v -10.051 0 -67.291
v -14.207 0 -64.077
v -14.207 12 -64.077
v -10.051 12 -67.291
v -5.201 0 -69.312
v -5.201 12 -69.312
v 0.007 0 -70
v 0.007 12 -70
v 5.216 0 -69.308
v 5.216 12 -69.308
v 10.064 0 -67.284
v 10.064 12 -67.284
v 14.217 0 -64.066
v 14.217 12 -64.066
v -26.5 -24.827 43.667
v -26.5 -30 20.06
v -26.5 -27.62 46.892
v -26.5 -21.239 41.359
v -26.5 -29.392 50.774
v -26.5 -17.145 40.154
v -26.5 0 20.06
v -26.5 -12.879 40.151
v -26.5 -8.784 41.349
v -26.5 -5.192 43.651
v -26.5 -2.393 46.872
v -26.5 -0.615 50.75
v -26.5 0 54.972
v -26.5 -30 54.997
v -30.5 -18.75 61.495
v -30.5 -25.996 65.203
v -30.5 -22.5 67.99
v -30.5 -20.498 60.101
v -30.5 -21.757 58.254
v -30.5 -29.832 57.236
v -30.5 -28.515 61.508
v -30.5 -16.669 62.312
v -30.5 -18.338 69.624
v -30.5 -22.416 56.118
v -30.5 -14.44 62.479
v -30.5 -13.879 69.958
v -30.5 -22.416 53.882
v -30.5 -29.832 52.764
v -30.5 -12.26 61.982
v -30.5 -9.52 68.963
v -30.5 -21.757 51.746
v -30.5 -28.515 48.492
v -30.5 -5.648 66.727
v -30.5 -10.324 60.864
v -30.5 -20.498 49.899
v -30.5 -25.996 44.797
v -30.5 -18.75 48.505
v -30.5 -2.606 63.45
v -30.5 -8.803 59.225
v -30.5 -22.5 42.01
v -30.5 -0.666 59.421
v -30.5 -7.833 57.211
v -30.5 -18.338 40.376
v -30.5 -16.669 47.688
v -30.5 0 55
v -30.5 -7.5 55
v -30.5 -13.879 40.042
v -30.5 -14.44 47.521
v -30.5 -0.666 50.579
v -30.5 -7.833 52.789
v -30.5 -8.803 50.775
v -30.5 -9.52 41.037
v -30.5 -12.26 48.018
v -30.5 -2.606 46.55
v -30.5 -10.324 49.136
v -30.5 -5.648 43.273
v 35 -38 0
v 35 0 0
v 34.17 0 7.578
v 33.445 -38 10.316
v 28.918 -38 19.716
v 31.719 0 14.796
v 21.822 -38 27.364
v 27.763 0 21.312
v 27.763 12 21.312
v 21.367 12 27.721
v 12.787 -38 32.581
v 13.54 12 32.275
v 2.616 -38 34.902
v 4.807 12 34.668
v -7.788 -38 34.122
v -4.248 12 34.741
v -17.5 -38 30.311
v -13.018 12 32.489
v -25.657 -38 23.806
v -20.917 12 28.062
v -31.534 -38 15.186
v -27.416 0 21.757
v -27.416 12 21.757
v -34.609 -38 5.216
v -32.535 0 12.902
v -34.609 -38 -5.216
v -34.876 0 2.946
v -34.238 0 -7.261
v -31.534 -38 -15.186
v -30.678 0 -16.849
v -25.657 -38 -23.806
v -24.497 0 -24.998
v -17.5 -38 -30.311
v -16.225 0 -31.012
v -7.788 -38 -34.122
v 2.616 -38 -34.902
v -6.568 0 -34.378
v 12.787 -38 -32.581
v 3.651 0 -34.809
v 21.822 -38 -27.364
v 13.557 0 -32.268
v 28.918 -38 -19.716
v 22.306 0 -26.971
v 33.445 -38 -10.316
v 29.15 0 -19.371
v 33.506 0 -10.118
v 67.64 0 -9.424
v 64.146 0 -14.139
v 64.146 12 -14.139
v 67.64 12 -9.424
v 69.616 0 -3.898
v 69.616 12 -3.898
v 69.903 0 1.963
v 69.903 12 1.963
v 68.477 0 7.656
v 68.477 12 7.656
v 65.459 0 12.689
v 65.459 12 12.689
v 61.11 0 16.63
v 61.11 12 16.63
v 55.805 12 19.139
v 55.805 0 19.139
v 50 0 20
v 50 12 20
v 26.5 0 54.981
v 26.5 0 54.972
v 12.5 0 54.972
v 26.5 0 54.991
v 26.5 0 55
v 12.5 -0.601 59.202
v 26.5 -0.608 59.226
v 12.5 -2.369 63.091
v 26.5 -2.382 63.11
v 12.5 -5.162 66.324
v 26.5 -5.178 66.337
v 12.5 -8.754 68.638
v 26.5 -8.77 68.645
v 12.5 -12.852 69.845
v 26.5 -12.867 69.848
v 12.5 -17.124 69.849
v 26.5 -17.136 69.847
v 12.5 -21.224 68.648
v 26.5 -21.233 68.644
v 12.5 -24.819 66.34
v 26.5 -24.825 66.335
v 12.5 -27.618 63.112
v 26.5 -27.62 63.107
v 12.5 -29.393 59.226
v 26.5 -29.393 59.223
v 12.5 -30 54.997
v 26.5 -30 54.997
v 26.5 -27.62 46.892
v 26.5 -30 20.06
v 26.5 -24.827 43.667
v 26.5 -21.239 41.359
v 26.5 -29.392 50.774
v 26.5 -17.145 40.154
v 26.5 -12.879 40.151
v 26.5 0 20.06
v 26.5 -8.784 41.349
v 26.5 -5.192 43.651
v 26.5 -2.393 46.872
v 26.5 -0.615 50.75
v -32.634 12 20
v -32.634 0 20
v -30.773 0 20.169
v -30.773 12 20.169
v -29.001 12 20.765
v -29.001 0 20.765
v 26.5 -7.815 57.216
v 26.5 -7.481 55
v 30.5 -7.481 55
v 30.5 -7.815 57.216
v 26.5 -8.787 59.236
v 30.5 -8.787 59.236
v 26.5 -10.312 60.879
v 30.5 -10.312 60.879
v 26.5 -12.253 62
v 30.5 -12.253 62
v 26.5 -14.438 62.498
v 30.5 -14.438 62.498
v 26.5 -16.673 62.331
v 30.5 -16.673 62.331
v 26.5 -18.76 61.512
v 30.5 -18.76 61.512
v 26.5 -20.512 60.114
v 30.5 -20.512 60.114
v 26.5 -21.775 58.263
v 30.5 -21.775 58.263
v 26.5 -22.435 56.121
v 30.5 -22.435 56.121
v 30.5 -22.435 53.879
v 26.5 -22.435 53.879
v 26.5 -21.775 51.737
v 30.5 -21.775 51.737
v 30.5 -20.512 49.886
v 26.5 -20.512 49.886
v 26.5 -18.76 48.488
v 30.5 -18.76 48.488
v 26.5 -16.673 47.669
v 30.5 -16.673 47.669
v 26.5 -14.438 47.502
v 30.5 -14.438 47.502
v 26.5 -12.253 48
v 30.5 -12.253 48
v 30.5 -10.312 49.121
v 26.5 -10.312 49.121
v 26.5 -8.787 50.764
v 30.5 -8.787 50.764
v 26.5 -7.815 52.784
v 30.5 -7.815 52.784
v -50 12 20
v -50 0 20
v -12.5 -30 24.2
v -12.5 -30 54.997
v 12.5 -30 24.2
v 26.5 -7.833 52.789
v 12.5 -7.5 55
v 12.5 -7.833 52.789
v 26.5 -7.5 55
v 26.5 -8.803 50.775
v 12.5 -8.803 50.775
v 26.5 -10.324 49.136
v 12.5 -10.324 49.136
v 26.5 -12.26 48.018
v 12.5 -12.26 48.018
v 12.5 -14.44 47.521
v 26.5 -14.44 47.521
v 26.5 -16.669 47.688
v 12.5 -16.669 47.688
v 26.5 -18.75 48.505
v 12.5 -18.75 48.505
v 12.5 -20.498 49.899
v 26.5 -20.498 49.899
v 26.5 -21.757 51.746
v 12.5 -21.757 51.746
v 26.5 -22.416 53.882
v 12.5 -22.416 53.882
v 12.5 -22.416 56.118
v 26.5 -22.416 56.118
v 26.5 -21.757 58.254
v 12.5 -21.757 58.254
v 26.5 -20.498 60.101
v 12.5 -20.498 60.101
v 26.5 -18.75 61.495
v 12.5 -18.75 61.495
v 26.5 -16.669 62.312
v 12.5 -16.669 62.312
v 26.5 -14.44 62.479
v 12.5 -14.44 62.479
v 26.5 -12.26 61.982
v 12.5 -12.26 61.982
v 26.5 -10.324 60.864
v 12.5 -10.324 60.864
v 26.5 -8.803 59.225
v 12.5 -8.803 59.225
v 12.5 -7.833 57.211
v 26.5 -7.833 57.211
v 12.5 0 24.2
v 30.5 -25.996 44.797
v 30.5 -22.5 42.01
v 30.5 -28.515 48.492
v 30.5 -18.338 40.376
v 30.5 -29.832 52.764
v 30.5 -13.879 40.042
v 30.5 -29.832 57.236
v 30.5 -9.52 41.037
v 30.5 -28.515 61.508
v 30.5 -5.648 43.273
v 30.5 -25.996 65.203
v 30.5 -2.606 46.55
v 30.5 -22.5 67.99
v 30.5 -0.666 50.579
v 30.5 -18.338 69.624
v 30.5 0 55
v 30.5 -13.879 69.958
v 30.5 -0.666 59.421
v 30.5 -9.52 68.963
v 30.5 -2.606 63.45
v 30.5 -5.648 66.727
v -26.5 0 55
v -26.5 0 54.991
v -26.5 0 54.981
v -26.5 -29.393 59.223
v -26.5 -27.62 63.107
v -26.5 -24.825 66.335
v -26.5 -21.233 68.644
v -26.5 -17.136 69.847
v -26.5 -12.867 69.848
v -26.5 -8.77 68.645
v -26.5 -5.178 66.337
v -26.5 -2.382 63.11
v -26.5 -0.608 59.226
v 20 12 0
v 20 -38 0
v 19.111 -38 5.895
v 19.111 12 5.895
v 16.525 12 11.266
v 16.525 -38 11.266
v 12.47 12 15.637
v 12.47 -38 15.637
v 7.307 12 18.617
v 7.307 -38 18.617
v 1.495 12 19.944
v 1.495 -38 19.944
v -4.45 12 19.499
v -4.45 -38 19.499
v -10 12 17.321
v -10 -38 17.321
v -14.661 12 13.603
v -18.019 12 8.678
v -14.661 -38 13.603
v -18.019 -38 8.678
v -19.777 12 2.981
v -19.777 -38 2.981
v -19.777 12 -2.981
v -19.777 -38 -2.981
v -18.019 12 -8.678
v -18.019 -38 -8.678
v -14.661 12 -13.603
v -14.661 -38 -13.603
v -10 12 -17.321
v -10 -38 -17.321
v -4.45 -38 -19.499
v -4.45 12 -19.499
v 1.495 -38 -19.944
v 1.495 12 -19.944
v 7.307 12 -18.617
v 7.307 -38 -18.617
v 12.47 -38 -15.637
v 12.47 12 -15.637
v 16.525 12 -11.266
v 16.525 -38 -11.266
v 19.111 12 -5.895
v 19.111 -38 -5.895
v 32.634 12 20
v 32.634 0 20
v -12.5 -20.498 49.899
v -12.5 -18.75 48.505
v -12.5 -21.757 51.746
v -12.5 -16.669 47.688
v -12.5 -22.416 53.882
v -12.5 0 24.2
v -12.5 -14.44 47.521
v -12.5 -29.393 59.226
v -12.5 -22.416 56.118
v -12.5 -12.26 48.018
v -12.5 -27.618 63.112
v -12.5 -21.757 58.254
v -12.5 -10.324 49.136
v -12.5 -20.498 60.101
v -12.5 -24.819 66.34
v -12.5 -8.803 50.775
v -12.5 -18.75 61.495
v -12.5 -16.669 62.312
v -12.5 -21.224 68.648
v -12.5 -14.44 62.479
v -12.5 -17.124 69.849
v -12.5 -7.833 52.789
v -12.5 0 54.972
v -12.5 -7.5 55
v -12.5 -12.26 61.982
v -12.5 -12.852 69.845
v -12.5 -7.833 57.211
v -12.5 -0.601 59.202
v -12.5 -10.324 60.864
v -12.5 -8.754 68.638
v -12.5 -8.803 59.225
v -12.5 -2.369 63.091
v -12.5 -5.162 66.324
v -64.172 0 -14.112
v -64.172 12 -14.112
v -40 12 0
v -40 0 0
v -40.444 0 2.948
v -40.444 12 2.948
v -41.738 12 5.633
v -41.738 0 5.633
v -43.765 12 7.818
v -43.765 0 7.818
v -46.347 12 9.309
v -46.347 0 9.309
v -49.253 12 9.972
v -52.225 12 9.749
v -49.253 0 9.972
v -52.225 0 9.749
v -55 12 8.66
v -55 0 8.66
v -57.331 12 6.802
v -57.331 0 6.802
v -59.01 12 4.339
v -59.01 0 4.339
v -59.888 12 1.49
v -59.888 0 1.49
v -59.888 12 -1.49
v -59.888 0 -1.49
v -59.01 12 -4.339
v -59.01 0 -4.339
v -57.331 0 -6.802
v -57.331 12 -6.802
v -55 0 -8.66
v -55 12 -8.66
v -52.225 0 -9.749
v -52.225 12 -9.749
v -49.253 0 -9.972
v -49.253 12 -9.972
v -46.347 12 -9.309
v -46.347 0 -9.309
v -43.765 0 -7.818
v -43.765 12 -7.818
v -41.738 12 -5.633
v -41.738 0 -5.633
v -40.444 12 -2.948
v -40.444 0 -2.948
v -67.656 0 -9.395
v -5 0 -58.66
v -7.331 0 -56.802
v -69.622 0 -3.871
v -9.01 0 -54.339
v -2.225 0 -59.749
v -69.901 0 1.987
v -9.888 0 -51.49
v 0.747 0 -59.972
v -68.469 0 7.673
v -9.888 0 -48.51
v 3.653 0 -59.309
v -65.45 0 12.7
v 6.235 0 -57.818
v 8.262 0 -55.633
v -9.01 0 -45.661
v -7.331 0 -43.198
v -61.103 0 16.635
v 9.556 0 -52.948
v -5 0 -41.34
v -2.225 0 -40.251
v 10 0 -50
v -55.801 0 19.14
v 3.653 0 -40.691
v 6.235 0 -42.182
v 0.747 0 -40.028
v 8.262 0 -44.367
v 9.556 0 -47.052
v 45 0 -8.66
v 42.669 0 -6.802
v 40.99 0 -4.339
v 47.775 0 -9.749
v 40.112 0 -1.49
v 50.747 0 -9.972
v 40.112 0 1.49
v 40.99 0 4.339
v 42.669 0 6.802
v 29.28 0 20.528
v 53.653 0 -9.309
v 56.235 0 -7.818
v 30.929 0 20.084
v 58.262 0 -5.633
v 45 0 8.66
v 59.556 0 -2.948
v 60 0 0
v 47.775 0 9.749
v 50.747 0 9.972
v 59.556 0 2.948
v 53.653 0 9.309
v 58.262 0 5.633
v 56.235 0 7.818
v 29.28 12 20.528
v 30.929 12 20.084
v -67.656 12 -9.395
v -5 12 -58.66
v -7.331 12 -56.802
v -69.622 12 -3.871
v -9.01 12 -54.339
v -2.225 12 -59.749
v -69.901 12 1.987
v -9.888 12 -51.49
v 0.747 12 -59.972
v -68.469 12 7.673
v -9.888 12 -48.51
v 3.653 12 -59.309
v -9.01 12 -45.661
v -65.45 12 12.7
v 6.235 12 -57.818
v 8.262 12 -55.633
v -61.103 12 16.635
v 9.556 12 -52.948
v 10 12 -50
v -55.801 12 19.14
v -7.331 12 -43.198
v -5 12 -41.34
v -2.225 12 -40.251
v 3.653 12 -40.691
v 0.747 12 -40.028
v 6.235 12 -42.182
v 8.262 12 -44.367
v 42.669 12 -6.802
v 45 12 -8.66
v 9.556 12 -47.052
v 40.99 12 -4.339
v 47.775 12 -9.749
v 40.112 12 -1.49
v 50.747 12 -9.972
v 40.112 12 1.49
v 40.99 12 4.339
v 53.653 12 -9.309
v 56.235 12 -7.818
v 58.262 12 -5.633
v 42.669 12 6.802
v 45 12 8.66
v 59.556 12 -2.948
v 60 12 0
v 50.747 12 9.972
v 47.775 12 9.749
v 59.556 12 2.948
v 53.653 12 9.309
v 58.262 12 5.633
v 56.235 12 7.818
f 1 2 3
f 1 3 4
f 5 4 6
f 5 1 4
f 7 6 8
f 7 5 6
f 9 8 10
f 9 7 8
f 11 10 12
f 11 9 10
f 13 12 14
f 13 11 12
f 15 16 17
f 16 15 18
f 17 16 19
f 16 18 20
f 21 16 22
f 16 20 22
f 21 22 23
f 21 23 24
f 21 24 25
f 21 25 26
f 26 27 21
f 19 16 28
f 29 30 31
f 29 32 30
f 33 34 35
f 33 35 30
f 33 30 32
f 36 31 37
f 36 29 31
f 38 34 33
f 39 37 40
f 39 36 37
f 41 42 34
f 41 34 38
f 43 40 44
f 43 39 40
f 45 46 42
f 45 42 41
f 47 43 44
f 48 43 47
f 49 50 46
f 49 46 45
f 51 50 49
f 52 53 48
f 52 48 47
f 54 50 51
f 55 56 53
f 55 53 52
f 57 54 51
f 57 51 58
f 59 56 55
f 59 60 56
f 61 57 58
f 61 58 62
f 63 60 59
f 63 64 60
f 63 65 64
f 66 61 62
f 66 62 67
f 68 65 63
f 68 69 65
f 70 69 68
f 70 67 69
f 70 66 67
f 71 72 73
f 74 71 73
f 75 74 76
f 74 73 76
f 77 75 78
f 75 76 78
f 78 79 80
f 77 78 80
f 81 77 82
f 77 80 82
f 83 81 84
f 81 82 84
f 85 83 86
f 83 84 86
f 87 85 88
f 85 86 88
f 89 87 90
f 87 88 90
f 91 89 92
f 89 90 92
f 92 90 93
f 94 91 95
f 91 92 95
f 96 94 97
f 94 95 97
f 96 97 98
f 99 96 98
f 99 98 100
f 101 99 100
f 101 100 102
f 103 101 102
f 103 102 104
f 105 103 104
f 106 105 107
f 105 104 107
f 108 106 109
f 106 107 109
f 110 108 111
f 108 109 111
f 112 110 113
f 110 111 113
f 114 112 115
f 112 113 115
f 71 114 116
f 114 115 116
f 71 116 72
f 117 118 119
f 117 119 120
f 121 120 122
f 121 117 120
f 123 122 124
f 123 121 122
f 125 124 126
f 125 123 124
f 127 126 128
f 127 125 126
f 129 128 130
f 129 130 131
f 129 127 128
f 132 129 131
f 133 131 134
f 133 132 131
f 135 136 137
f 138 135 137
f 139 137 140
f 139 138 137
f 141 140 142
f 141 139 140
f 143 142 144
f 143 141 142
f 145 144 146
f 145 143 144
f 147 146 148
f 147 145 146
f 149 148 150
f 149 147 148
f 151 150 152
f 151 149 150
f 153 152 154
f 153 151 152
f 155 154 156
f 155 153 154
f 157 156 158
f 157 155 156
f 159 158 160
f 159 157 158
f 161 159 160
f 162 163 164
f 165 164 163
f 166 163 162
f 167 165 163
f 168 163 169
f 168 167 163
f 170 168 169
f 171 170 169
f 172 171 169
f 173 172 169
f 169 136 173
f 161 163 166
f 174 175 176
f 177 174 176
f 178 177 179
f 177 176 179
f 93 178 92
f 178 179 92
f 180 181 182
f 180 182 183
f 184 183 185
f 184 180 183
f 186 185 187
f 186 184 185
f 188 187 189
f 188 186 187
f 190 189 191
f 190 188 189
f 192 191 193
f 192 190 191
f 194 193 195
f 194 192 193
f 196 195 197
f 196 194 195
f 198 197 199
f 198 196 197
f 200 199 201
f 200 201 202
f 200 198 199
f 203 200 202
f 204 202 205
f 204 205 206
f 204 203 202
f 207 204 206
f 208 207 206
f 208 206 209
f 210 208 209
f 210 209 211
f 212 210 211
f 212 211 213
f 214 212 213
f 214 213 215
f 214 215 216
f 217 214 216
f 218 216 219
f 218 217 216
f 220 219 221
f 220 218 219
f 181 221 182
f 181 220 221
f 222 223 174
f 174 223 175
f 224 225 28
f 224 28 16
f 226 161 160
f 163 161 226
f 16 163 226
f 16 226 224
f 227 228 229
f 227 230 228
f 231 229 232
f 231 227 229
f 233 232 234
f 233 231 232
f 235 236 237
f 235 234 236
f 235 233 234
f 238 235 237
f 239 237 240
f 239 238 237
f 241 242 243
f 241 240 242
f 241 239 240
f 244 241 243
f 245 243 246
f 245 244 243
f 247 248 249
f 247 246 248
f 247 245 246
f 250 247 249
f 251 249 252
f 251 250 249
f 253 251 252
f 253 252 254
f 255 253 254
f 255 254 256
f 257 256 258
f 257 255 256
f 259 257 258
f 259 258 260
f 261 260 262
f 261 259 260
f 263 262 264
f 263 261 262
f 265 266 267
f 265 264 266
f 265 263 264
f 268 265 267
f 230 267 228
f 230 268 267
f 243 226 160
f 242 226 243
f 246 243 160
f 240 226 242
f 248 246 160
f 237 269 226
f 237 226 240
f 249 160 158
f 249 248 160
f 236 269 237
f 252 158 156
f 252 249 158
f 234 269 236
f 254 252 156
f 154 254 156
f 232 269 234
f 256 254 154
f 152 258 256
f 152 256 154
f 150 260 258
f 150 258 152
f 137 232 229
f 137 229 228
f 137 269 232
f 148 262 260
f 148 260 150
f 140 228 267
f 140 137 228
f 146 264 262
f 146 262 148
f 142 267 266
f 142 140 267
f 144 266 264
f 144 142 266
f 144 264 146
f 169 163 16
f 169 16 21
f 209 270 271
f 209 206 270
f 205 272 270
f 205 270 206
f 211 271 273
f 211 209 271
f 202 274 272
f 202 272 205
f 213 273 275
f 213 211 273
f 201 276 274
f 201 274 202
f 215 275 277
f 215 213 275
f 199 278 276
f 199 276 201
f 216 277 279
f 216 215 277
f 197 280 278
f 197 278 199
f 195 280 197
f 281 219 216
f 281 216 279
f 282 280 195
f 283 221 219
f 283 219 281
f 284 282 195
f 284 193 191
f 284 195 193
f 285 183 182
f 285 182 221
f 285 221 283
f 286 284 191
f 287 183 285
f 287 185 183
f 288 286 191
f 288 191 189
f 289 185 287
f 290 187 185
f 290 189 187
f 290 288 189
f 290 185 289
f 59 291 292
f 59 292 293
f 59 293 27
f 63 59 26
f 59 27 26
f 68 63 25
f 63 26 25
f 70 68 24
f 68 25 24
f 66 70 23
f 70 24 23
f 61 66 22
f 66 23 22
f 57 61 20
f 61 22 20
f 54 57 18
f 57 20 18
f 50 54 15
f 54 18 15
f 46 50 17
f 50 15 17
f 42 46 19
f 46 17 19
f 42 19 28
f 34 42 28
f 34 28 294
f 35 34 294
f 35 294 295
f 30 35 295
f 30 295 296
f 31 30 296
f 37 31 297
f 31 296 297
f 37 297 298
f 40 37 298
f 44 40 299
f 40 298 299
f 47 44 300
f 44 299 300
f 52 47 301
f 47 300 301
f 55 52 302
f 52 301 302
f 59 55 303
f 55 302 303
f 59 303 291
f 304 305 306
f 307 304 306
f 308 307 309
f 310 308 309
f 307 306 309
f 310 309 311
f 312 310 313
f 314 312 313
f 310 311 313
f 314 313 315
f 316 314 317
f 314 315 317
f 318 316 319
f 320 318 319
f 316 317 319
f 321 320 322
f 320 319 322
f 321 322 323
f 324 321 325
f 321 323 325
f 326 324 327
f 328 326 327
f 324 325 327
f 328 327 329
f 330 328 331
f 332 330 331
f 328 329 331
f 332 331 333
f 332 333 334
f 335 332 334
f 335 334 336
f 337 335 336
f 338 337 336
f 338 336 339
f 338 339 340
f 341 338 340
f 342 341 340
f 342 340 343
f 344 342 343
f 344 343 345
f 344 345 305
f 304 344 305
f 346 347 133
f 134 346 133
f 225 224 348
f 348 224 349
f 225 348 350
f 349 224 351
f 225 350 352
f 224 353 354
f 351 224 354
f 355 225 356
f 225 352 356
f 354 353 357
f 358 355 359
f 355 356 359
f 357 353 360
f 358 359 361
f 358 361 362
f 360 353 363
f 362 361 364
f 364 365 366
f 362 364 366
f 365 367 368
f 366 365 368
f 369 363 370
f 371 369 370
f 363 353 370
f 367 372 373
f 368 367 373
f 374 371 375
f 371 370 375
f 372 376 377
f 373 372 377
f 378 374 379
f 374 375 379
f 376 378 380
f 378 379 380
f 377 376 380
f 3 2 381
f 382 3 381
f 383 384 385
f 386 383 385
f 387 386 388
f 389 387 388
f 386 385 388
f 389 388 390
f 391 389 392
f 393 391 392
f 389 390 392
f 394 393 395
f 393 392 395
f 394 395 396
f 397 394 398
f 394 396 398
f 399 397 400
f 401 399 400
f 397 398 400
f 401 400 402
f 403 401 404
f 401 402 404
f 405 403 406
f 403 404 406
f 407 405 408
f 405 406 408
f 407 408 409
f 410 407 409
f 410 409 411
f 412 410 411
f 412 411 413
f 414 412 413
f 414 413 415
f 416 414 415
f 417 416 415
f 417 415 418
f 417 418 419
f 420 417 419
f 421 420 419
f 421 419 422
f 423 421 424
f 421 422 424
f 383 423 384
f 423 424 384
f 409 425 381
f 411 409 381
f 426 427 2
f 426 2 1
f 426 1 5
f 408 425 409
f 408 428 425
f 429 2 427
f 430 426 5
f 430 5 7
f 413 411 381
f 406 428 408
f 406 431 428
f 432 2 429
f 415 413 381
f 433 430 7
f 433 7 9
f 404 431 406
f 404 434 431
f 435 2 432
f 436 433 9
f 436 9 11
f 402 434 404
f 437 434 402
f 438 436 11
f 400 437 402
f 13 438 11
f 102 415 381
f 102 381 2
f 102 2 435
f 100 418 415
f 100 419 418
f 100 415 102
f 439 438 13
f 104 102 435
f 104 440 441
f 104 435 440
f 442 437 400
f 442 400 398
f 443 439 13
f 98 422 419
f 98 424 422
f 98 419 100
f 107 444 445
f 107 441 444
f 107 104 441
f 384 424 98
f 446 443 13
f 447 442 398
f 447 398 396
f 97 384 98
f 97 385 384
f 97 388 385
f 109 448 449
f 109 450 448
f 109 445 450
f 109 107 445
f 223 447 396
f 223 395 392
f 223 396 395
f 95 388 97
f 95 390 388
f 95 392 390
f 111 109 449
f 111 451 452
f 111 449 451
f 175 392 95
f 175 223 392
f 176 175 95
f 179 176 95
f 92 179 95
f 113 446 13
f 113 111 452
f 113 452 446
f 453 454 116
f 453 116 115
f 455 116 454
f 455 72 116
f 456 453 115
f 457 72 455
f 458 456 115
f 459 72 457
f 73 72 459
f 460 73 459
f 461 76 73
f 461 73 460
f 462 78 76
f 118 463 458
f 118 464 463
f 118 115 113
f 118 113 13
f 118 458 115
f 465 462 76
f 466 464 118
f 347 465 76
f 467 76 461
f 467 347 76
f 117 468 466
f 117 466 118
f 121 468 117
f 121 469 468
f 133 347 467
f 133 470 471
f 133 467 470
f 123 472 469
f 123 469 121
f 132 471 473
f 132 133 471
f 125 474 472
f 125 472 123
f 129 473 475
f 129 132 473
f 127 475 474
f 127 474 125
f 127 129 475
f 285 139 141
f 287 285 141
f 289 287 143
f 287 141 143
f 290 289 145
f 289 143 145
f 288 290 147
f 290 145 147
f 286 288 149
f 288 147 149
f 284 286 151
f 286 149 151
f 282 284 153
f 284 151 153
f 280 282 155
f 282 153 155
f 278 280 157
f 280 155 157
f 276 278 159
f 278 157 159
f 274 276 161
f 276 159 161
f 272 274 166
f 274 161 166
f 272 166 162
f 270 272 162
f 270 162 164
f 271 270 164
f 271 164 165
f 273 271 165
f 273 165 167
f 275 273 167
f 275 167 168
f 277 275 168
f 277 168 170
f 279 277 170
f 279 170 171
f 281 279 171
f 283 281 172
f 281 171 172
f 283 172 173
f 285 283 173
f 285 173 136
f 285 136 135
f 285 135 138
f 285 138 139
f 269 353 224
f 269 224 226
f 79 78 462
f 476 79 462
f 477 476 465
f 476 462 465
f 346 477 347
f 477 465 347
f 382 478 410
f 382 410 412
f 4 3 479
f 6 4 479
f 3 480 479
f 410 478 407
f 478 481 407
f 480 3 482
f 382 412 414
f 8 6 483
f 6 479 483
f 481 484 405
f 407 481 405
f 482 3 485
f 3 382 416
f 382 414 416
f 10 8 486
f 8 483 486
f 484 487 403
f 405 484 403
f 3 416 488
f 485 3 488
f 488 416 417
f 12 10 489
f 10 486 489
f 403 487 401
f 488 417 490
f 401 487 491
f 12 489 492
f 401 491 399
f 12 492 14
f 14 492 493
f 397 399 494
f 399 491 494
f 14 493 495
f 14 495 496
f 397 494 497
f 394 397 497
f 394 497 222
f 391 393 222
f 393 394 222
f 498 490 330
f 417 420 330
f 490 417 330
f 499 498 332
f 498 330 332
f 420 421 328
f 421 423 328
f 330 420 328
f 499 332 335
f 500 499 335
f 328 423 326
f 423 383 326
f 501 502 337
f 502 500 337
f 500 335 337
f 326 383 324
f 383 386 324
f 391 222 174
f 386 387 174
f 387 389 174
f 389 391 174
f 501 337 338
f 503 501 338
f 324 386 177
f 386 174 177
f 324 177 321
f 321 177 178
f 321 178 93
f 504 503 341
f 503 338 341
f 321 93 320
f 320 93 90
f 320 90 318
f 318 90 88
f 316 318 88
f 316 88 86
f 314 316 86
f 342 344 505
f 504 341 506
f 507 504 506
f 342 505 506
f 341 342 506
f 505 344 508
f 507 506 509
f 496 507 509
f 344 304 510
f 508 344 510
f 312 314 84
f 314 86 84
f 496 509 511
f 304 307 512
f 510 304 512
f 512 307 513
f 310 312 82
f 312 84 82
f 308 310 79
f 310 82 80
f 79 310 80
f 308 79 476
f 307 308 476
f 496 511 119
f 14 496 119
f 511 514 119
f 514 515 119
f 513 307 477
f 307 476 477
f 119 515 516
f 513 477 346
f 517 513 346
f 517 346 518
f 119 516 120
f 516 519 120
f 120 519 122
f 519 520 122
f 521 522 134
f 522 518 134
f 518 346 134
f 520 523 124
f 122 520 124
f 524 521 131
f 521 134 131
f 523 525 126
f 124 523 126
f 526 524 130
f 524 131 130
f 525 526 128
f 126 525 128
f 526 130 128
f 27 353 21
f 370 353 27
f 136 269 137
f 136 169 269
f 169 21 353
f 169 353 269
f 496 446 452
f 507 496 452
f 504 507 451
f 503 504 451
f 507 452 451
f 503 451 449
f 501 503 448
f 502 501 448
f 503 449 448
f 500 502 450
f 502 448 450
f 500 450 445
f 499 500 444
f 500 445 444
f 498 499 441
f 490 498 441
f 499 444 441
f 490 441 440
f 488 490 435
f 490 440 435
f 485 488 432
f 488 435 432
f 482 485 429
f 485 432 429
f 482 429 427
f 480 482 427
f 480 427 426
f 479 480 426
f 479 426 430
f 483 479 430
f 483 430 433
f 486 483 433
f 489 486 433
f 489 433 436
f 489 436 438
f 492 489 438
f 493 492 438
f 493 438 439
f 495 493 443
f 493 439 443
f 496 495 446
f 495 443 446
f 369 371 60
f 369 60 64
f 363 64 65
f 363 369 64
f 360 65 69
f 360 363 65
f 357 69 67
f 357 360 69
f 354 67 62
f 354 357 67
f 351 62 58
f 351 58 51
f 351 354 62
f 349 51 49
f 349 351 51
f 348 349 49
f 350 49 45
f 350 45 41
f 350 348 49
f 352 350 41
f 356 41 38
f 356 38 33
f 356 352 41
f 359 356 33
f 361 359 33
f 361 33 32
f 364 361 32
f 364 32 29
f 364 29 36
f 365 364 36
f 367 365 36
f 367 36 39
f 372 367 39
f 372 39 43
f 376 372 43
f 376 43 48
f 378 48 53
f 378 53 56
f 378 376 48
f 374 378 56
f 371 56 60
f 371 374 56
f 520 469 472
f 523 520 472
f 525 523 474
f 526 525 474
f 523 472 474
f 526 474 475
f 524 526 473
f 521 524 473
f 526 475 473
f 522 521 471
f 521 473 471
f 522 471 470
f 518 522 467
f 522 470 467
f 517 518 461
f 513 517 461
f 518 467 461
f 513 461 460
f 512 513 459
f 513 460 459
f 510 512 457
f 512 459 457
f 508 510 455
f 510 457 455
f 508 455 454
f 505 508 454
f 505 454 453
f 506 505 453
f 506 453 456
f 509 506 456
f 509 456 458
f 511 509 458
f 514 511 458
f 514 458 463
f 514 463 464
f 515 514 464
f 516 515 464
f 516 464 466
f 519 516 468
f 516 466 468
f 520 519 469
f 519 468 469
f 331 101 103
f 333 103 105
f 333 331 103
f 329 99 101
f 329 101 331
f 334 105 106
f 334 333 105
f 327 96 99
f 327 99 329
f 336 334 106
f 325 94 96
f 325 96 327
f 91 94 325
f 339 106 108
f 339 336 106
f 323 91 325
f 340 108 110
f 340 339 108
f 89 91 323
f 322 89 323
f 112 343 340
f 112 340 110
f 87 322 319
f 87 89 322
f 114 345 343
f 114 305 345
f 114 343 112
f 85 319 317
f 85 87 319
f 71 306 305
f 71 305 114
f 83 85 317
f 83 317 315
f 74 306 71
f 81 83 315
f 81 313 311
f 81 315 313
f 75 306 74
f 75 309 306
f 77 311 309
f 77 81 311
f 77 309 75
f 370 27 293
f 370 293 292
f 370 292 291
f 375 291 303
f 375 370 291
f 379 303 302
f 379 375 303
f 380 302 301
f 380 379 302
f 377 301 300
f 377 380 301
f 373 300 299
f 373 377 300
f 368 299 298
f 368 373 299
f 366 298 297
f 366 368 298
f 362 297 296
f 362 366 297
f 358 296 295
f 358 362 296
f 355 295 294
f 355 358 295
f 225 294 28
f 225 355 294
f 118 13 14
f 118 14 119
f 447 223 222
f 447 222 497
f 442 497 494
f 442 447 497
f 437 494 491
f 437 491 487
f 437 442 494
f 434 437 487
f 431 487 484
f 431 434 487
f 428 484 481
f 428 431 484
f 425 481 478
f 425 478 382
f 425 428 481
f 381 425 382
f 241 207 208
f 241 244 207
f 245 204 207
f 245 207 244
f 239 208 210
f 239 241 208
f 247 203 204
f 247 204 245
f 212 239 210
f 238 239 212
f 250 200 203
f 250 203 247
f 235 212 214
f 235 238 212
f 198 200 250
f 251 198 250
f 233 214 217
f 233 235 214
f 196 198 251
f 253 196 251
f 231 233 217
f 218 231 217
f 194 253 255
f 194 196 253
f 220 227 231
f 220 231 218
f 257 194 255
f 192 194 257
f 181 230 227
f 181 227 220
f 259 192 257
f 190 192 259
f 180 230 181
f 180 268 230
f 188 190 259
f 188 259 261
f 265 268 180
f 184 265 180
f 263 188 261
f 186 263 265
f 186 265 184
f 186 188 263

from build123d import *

# Parameters (mm, degrees)
SKETCH_R      = 10
PAD_DEPTH     = 12
SKETCH001_R   = 35
PAD001_DEPTH  = 38
SKETCH002_R   = 20
POCKET_DEPTH  = 50.0010001001
SKETCH007_W   = 25
SKETCH007_H   = 67.86781
PAD005_DEPTH  = 35
SKETCH003_R   = 7.5
PAD002_DEPTH  = 26.5
SKETCH004_R   = 15
SKETCH004_R_2 = 7.519347
PAD003_DEPTH  = 4
SKETCH005_R   = 15
SKETCH005_R_2 = 7.5
PAD004_DEPTH  = 4


with BuildPart() as pocket:
    # Sketch → Pad (new body)
    with BuildSketch(Plane.XZ):
        with BuildLine():
            ThreePointArc((64.1455828599, -14.1386875471), (68.4766574692, 7.6559211573), (49.9999994008, 20))
            Line((32.6341387324, 20), (49.9999994008, 20))
            ThreePointArc((27.7632558123, 21.3120066325), (30.0925786366, 20.2620331658), (32.6341387324, 20))
            ThreePointArc((27.7632558123, 21.3120066325), (0.2819327298, 34.9988644664), (-27.4163181857, 21.7565047087))
            ThreePointArc((-32.6343266922, 20), (-29.8694565663, 20.4152251587), (-27.4163181857, 21.7565047087))
            Line((-50.0000063638, 20), (-32.6343266922, 20))
            ThreePointArc((-50.0000063638, 20), (-68.4694998513, 7.6731724367), (-64.1719702082, -14.1122379663))
            Line((-14.2068552394, -64.0771184625), (-64.1719702082, -14.1122379663))
            ThreePointArc((-14.2068552394, -64.0771184625), (0.00748211, -69.9999986005), (14.2173839169, -64.0664847975))
            Line((14.2173839169, -64.0664847975), (64.1455828599, -14.1386875471))
        make_face()
        with Locations((-50, 0)):
            Circle(SKETCH_R, mode=Mode.SUBTRACT)
        with Locations((50, 0)):
            Circle(SKETCH_R, mode=Mode.SUBTRACT)
        with Locations((0, -50)):
            Circle(SKETCH_R, mode=Mode.SUBTRACT)
    extrude(amount=-PAD_DEPTH)

    # Sketch001 → Pad001 (new body)
    with BuildSketch(Plane.XZ):
        Circle(SKETCH001_R)
    extrude(amount=PAD001_DEPTH)

    # Sketch002 → Pocket (cut, through all)
    with BuildSketch(Plane.XZ.offset(38)):
        Circle(SKETCH002_R)
    extrude(amount=-POCKET_DEPTH, mode=Mode.SUBTRACT)


with BuildPart() as pad005:
    # Sketch007 → Pad005 (new body)
    with BuildSketch(Plane.XZ):
        with Locations((0, 58.133799)):
            Rectangle(SKETCH007_W, SKETCH007_H)
    extrude(amount=PAD005_DEPTH)


with BuildPart() as cut:
    # Sketch003 → Pad002 (new body, symmetric)
    with BuildSketch(Plane.YZ):
        with BuildLine():
            ThreePointArc((-2.58777e-05, 54.9721373105), (-14.9877042055, 69.9999949604), (-29.9999996433, 54.9967288863))
            Line((-29.9999996433, 54.9967288863), (-29.9999996433, 20.060029))
            Line((-29.9999996433, 20.060029), (3.567e-07, 20.060029))
            Line((3.567e-07, 20.060029), (-2.58777e-05, 54.9721373105))
        make_face()
        with Locations((-15, 55)):
            Circle(SKETCH003_R, mode=Mode.SUBTRACT)
    extrude(amount=PAD002_DEPTH, both=True)

    # Sketch004 → Pad003 (new body)
    with BuildSketch(Plane.YZ.offset(26.5)):
        with Locations((-15, 55)):
            Circle(SKETCH004_R)
        with Locations((-15, 55)):
            Circle(SKETCH004_R_2, mode=Mode.SUBTRACT)
    extrude(amount=PAD003_DEPTH)

    # Sketch005 → Pad004 (new body)
    with BuildSketch(Plane(origin=(-26.5, 0, 0), x_dir=(0, 1, 0), z_dir=(-1, 0, 0))):
        with Locations((-15, -55)):
            Circle(SKETCH005_R)
        with Locations((-15, -55)):
            Circle(SKETCH005_R_2, mode=Mode.SUBTRACT)
    extrude(amount=PAD004_DEPTH)

    # Cut: cut Pad005
    add(pad005.part, mode=Mode.SUBTRACT)


solid = Compound([pocket.part, cut.part])
